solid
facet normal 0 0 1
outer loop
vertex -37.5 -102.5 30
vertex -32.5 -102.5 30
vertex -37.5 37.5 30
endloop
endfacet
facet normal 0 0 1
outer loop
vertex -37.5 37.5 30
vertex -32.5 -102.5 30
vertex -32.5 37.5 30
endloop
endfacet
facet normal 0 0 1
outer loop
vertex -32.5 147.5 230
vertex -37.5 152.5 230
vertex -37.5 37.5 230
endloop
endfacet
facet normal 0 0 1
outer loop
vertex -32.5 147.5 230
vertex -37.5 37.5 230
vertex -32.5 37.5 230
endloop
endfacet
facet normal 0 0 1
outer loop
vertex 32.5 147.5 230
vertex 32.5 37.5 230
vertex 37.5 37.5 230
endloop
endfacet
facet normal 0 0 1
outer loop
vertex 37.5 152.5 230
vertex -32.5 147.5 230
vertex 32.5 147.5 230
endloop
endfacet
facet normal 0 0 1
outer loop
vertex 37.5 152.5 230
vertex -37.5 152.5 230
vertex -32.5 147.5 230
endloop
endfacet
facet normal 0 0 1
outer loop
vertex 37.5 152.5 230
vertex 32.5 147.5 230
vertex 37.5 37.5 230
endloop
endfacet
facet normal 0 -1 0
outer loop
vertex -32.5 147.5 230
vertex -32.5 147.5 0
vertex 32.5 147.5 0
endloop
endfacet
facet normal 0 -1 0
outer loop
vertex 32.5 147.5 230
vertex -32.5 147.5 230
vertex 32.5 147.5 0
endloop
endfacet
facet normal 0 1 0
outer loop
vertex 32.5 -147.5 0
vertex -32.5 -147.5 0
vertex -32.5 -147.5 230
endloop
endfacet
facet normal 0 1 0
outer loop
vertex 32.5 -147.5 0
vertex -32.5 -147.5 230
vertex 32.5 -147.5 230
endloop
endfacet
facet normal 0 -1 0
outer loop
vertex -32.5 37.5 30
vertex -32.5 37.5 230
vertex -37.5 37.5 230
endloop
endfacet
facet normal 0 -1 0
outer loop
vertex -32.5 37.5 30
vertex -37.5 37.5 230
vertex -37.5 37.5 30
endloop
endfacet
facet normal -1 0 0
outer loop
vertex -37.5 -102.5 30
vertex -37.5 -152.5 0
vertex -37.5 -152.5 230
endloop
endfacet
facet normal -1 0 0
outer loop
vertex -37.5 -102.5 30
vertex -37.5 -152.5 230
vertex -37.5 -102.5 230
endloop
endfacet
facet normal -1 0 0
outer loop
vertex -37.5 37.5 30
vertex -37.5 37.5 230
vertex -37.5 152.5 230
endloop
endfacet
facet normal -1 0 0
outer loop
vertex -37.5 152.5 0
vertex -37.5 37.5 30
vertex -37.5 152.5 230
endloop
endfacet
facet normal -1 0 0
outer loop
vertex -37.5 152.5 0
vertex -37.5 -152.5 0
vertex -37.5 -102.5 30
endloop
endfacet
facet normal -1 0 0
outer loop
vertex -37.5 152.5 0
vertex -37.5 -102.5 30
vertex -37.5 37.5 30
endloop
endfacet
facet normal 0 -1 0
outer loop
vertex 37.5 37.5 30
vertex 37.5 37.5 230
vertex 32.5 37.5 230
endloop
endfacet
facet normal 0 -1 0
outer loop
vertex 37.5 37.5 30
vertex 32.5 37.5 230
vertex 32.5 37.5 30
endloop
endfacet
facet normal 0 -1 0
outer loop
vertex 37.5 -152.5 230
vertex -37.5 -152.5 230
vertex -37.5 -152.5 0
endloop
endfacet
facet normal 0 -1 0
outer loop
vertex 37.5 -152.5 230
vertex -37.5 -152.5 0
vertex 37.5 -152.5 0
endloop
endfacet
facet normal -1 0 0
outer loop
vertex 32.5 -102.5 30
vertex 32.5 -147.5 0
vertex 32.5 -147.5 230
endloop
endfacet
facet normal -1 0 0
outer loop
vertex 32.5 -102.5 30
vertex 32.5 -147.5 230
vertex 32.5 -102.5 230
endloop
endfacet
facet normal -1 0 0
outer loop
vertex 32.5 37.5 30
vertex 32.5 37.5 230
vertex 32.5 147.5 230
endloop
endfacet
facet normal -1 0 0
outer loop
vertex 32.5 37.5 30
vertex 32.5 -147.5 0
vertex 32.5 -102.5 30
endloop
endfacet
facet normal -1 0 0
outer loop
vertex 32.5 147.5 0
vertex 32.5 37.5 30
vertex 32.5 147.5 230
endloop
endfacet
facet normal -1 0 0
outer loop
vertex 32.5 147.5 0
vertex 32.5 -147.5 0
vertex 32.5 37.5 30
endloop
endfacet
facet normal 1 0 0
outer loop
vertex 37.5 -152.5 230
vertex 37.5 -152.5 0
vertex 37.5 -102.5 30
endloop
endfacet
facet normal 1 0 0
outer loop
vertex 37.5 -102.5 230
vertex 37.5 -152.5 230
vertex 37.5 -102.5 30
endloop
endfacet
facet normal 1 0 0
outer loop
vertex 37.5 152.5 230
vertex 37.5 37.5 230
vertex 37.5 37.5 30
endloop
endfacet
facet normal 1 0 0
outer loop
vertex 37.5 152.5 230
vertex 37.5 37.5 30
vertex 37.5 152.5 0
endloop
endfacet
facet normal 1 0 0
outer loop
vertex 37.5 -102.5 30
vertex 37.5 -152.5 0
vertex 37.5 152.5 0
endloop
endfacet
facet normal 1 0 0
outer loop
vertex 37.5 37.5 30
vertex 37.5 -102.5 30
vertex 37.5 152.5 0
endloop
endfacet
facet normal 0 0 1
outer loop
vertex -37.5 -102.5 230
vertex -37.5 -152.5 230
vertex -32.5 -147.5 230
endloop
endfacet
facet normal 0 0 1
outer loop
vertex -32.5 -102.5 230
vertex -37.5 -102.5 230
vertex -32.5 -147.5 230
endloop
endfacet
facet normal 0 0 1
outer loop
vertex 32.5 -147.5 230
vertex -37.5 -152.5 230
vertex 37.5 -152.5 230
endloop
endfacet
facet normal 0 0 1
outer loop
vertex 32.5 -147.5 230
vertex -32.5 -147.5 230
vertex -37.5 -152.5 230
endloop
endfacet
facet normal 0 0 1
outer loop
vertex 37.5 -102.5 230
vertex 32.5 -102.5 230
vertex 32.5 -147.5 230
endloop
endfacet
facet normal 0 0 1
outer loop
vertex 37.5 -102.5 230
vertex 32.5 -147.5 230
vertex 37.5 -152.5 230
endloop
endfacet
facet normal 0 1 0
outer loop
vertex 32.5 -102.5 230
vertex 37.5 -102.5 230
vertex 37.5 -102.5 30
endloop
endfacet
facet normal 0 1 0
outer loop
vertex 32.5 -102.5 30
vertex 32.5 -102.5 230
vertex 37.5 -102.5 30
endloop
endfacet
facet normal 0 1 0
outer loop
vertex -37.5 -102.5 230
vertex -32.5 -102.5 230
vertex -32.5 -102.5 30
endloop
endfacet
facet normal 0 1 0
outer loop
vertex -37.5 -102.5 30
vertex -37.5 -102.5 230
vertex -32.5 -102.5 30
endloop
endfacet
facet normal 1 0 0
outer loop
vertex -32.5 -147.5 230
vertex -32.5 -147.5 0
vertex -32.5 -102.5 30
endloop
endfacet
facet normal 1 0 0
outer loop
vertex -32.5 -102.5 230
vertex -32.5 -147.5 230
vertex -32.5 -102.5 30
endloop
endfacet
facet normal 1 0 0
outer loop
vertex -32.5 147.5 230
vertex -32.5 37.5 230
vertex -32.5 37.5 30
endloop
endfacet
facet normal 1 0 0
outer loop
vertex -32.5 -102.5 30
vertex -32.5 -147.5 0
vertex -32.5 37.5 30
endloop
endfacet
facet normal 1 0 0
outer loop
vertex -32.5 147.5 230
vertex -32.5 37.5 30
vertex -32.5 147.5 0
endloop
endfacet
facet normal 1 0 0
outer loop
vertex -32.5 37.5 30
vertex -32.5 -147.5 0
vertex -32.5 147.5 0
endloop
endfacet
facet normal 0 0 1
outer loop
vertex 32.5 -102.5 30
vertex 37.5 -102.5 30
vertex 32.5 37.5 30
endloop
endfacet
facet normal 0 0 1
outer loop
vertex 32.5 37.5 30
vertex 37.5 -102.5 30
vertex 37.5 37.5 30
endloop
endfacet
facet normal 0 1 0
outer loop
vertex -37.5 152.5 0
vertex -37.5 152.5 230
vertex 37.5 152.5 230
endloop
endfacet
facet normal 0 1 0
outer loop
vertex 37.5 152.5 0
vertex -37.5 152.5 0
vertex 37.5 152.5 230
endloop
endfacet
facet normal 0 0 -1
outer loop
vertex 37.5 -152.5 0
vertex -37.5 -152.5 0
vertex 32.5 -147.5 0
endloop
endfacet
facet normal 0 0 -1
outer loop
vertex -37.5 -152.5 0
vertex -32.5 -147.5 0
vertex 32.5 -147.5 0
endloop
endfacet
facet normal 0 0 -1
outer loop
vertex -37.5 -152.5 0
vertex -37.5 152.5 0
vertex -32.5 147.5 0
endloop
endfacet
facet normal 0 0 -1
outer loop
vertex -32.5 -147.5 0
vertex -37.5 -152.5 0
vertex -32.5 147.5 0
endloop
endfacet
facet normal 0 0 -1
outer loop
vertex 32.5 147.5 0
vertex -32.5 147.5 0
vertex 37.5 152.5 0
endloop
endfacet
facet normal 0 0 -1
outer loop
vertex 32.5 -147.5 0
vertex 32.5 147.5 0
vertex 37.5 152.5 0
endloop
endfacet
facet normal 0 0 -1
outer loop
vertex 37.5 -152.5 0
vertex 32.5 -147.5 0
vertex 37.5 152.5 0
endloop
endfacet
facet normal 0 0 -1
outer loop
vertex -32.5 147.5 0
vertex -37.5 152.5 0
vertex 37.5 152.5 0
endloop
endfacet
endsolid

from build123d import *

# Parameters (mm, degrees)
SKETCH1_W           = 75
SKETCH1_H           = 305
SKETCH1_W_2         = 65
SKETCH1_H_2         = 295
BOSS_EXTRUDE1_DEPTH = 230
SKETCH2_W           = 200
SKETCH2_H           = 140
CUT_EXTRUDE1_DEPTH  = 286.974212124


with BuildPart() as part:
    # Sketch1 → Boss-Extrude1 (new body)
    with BuildSketch(Plane.XY):
        Rectangle(SKETCH1_W, SKETCH1_H)
        Rectangle(SKETCH1_W_2, SKETCH1_H_2, mode=Mode.SUBTRACT)
    extrude(amount=BOSS_EXTRUDE1_DEPTH)

    # Sketch2 → Cut-Extrude1 (cut, through all)
    with BuildSketch(Plane(origin=(37.5, 0, 0), x_dir=(0, 0, -1), z_dir=(1, 0, 0))):
        with Locations((-130, -32.5)):
            Rectangle(SKETCH2_W, SKETCH2_H)
    extrude(amount=-CUT_EXTRUDE1_DEPTH, mode=Mode.SUBTRACT)


solid = part.part
